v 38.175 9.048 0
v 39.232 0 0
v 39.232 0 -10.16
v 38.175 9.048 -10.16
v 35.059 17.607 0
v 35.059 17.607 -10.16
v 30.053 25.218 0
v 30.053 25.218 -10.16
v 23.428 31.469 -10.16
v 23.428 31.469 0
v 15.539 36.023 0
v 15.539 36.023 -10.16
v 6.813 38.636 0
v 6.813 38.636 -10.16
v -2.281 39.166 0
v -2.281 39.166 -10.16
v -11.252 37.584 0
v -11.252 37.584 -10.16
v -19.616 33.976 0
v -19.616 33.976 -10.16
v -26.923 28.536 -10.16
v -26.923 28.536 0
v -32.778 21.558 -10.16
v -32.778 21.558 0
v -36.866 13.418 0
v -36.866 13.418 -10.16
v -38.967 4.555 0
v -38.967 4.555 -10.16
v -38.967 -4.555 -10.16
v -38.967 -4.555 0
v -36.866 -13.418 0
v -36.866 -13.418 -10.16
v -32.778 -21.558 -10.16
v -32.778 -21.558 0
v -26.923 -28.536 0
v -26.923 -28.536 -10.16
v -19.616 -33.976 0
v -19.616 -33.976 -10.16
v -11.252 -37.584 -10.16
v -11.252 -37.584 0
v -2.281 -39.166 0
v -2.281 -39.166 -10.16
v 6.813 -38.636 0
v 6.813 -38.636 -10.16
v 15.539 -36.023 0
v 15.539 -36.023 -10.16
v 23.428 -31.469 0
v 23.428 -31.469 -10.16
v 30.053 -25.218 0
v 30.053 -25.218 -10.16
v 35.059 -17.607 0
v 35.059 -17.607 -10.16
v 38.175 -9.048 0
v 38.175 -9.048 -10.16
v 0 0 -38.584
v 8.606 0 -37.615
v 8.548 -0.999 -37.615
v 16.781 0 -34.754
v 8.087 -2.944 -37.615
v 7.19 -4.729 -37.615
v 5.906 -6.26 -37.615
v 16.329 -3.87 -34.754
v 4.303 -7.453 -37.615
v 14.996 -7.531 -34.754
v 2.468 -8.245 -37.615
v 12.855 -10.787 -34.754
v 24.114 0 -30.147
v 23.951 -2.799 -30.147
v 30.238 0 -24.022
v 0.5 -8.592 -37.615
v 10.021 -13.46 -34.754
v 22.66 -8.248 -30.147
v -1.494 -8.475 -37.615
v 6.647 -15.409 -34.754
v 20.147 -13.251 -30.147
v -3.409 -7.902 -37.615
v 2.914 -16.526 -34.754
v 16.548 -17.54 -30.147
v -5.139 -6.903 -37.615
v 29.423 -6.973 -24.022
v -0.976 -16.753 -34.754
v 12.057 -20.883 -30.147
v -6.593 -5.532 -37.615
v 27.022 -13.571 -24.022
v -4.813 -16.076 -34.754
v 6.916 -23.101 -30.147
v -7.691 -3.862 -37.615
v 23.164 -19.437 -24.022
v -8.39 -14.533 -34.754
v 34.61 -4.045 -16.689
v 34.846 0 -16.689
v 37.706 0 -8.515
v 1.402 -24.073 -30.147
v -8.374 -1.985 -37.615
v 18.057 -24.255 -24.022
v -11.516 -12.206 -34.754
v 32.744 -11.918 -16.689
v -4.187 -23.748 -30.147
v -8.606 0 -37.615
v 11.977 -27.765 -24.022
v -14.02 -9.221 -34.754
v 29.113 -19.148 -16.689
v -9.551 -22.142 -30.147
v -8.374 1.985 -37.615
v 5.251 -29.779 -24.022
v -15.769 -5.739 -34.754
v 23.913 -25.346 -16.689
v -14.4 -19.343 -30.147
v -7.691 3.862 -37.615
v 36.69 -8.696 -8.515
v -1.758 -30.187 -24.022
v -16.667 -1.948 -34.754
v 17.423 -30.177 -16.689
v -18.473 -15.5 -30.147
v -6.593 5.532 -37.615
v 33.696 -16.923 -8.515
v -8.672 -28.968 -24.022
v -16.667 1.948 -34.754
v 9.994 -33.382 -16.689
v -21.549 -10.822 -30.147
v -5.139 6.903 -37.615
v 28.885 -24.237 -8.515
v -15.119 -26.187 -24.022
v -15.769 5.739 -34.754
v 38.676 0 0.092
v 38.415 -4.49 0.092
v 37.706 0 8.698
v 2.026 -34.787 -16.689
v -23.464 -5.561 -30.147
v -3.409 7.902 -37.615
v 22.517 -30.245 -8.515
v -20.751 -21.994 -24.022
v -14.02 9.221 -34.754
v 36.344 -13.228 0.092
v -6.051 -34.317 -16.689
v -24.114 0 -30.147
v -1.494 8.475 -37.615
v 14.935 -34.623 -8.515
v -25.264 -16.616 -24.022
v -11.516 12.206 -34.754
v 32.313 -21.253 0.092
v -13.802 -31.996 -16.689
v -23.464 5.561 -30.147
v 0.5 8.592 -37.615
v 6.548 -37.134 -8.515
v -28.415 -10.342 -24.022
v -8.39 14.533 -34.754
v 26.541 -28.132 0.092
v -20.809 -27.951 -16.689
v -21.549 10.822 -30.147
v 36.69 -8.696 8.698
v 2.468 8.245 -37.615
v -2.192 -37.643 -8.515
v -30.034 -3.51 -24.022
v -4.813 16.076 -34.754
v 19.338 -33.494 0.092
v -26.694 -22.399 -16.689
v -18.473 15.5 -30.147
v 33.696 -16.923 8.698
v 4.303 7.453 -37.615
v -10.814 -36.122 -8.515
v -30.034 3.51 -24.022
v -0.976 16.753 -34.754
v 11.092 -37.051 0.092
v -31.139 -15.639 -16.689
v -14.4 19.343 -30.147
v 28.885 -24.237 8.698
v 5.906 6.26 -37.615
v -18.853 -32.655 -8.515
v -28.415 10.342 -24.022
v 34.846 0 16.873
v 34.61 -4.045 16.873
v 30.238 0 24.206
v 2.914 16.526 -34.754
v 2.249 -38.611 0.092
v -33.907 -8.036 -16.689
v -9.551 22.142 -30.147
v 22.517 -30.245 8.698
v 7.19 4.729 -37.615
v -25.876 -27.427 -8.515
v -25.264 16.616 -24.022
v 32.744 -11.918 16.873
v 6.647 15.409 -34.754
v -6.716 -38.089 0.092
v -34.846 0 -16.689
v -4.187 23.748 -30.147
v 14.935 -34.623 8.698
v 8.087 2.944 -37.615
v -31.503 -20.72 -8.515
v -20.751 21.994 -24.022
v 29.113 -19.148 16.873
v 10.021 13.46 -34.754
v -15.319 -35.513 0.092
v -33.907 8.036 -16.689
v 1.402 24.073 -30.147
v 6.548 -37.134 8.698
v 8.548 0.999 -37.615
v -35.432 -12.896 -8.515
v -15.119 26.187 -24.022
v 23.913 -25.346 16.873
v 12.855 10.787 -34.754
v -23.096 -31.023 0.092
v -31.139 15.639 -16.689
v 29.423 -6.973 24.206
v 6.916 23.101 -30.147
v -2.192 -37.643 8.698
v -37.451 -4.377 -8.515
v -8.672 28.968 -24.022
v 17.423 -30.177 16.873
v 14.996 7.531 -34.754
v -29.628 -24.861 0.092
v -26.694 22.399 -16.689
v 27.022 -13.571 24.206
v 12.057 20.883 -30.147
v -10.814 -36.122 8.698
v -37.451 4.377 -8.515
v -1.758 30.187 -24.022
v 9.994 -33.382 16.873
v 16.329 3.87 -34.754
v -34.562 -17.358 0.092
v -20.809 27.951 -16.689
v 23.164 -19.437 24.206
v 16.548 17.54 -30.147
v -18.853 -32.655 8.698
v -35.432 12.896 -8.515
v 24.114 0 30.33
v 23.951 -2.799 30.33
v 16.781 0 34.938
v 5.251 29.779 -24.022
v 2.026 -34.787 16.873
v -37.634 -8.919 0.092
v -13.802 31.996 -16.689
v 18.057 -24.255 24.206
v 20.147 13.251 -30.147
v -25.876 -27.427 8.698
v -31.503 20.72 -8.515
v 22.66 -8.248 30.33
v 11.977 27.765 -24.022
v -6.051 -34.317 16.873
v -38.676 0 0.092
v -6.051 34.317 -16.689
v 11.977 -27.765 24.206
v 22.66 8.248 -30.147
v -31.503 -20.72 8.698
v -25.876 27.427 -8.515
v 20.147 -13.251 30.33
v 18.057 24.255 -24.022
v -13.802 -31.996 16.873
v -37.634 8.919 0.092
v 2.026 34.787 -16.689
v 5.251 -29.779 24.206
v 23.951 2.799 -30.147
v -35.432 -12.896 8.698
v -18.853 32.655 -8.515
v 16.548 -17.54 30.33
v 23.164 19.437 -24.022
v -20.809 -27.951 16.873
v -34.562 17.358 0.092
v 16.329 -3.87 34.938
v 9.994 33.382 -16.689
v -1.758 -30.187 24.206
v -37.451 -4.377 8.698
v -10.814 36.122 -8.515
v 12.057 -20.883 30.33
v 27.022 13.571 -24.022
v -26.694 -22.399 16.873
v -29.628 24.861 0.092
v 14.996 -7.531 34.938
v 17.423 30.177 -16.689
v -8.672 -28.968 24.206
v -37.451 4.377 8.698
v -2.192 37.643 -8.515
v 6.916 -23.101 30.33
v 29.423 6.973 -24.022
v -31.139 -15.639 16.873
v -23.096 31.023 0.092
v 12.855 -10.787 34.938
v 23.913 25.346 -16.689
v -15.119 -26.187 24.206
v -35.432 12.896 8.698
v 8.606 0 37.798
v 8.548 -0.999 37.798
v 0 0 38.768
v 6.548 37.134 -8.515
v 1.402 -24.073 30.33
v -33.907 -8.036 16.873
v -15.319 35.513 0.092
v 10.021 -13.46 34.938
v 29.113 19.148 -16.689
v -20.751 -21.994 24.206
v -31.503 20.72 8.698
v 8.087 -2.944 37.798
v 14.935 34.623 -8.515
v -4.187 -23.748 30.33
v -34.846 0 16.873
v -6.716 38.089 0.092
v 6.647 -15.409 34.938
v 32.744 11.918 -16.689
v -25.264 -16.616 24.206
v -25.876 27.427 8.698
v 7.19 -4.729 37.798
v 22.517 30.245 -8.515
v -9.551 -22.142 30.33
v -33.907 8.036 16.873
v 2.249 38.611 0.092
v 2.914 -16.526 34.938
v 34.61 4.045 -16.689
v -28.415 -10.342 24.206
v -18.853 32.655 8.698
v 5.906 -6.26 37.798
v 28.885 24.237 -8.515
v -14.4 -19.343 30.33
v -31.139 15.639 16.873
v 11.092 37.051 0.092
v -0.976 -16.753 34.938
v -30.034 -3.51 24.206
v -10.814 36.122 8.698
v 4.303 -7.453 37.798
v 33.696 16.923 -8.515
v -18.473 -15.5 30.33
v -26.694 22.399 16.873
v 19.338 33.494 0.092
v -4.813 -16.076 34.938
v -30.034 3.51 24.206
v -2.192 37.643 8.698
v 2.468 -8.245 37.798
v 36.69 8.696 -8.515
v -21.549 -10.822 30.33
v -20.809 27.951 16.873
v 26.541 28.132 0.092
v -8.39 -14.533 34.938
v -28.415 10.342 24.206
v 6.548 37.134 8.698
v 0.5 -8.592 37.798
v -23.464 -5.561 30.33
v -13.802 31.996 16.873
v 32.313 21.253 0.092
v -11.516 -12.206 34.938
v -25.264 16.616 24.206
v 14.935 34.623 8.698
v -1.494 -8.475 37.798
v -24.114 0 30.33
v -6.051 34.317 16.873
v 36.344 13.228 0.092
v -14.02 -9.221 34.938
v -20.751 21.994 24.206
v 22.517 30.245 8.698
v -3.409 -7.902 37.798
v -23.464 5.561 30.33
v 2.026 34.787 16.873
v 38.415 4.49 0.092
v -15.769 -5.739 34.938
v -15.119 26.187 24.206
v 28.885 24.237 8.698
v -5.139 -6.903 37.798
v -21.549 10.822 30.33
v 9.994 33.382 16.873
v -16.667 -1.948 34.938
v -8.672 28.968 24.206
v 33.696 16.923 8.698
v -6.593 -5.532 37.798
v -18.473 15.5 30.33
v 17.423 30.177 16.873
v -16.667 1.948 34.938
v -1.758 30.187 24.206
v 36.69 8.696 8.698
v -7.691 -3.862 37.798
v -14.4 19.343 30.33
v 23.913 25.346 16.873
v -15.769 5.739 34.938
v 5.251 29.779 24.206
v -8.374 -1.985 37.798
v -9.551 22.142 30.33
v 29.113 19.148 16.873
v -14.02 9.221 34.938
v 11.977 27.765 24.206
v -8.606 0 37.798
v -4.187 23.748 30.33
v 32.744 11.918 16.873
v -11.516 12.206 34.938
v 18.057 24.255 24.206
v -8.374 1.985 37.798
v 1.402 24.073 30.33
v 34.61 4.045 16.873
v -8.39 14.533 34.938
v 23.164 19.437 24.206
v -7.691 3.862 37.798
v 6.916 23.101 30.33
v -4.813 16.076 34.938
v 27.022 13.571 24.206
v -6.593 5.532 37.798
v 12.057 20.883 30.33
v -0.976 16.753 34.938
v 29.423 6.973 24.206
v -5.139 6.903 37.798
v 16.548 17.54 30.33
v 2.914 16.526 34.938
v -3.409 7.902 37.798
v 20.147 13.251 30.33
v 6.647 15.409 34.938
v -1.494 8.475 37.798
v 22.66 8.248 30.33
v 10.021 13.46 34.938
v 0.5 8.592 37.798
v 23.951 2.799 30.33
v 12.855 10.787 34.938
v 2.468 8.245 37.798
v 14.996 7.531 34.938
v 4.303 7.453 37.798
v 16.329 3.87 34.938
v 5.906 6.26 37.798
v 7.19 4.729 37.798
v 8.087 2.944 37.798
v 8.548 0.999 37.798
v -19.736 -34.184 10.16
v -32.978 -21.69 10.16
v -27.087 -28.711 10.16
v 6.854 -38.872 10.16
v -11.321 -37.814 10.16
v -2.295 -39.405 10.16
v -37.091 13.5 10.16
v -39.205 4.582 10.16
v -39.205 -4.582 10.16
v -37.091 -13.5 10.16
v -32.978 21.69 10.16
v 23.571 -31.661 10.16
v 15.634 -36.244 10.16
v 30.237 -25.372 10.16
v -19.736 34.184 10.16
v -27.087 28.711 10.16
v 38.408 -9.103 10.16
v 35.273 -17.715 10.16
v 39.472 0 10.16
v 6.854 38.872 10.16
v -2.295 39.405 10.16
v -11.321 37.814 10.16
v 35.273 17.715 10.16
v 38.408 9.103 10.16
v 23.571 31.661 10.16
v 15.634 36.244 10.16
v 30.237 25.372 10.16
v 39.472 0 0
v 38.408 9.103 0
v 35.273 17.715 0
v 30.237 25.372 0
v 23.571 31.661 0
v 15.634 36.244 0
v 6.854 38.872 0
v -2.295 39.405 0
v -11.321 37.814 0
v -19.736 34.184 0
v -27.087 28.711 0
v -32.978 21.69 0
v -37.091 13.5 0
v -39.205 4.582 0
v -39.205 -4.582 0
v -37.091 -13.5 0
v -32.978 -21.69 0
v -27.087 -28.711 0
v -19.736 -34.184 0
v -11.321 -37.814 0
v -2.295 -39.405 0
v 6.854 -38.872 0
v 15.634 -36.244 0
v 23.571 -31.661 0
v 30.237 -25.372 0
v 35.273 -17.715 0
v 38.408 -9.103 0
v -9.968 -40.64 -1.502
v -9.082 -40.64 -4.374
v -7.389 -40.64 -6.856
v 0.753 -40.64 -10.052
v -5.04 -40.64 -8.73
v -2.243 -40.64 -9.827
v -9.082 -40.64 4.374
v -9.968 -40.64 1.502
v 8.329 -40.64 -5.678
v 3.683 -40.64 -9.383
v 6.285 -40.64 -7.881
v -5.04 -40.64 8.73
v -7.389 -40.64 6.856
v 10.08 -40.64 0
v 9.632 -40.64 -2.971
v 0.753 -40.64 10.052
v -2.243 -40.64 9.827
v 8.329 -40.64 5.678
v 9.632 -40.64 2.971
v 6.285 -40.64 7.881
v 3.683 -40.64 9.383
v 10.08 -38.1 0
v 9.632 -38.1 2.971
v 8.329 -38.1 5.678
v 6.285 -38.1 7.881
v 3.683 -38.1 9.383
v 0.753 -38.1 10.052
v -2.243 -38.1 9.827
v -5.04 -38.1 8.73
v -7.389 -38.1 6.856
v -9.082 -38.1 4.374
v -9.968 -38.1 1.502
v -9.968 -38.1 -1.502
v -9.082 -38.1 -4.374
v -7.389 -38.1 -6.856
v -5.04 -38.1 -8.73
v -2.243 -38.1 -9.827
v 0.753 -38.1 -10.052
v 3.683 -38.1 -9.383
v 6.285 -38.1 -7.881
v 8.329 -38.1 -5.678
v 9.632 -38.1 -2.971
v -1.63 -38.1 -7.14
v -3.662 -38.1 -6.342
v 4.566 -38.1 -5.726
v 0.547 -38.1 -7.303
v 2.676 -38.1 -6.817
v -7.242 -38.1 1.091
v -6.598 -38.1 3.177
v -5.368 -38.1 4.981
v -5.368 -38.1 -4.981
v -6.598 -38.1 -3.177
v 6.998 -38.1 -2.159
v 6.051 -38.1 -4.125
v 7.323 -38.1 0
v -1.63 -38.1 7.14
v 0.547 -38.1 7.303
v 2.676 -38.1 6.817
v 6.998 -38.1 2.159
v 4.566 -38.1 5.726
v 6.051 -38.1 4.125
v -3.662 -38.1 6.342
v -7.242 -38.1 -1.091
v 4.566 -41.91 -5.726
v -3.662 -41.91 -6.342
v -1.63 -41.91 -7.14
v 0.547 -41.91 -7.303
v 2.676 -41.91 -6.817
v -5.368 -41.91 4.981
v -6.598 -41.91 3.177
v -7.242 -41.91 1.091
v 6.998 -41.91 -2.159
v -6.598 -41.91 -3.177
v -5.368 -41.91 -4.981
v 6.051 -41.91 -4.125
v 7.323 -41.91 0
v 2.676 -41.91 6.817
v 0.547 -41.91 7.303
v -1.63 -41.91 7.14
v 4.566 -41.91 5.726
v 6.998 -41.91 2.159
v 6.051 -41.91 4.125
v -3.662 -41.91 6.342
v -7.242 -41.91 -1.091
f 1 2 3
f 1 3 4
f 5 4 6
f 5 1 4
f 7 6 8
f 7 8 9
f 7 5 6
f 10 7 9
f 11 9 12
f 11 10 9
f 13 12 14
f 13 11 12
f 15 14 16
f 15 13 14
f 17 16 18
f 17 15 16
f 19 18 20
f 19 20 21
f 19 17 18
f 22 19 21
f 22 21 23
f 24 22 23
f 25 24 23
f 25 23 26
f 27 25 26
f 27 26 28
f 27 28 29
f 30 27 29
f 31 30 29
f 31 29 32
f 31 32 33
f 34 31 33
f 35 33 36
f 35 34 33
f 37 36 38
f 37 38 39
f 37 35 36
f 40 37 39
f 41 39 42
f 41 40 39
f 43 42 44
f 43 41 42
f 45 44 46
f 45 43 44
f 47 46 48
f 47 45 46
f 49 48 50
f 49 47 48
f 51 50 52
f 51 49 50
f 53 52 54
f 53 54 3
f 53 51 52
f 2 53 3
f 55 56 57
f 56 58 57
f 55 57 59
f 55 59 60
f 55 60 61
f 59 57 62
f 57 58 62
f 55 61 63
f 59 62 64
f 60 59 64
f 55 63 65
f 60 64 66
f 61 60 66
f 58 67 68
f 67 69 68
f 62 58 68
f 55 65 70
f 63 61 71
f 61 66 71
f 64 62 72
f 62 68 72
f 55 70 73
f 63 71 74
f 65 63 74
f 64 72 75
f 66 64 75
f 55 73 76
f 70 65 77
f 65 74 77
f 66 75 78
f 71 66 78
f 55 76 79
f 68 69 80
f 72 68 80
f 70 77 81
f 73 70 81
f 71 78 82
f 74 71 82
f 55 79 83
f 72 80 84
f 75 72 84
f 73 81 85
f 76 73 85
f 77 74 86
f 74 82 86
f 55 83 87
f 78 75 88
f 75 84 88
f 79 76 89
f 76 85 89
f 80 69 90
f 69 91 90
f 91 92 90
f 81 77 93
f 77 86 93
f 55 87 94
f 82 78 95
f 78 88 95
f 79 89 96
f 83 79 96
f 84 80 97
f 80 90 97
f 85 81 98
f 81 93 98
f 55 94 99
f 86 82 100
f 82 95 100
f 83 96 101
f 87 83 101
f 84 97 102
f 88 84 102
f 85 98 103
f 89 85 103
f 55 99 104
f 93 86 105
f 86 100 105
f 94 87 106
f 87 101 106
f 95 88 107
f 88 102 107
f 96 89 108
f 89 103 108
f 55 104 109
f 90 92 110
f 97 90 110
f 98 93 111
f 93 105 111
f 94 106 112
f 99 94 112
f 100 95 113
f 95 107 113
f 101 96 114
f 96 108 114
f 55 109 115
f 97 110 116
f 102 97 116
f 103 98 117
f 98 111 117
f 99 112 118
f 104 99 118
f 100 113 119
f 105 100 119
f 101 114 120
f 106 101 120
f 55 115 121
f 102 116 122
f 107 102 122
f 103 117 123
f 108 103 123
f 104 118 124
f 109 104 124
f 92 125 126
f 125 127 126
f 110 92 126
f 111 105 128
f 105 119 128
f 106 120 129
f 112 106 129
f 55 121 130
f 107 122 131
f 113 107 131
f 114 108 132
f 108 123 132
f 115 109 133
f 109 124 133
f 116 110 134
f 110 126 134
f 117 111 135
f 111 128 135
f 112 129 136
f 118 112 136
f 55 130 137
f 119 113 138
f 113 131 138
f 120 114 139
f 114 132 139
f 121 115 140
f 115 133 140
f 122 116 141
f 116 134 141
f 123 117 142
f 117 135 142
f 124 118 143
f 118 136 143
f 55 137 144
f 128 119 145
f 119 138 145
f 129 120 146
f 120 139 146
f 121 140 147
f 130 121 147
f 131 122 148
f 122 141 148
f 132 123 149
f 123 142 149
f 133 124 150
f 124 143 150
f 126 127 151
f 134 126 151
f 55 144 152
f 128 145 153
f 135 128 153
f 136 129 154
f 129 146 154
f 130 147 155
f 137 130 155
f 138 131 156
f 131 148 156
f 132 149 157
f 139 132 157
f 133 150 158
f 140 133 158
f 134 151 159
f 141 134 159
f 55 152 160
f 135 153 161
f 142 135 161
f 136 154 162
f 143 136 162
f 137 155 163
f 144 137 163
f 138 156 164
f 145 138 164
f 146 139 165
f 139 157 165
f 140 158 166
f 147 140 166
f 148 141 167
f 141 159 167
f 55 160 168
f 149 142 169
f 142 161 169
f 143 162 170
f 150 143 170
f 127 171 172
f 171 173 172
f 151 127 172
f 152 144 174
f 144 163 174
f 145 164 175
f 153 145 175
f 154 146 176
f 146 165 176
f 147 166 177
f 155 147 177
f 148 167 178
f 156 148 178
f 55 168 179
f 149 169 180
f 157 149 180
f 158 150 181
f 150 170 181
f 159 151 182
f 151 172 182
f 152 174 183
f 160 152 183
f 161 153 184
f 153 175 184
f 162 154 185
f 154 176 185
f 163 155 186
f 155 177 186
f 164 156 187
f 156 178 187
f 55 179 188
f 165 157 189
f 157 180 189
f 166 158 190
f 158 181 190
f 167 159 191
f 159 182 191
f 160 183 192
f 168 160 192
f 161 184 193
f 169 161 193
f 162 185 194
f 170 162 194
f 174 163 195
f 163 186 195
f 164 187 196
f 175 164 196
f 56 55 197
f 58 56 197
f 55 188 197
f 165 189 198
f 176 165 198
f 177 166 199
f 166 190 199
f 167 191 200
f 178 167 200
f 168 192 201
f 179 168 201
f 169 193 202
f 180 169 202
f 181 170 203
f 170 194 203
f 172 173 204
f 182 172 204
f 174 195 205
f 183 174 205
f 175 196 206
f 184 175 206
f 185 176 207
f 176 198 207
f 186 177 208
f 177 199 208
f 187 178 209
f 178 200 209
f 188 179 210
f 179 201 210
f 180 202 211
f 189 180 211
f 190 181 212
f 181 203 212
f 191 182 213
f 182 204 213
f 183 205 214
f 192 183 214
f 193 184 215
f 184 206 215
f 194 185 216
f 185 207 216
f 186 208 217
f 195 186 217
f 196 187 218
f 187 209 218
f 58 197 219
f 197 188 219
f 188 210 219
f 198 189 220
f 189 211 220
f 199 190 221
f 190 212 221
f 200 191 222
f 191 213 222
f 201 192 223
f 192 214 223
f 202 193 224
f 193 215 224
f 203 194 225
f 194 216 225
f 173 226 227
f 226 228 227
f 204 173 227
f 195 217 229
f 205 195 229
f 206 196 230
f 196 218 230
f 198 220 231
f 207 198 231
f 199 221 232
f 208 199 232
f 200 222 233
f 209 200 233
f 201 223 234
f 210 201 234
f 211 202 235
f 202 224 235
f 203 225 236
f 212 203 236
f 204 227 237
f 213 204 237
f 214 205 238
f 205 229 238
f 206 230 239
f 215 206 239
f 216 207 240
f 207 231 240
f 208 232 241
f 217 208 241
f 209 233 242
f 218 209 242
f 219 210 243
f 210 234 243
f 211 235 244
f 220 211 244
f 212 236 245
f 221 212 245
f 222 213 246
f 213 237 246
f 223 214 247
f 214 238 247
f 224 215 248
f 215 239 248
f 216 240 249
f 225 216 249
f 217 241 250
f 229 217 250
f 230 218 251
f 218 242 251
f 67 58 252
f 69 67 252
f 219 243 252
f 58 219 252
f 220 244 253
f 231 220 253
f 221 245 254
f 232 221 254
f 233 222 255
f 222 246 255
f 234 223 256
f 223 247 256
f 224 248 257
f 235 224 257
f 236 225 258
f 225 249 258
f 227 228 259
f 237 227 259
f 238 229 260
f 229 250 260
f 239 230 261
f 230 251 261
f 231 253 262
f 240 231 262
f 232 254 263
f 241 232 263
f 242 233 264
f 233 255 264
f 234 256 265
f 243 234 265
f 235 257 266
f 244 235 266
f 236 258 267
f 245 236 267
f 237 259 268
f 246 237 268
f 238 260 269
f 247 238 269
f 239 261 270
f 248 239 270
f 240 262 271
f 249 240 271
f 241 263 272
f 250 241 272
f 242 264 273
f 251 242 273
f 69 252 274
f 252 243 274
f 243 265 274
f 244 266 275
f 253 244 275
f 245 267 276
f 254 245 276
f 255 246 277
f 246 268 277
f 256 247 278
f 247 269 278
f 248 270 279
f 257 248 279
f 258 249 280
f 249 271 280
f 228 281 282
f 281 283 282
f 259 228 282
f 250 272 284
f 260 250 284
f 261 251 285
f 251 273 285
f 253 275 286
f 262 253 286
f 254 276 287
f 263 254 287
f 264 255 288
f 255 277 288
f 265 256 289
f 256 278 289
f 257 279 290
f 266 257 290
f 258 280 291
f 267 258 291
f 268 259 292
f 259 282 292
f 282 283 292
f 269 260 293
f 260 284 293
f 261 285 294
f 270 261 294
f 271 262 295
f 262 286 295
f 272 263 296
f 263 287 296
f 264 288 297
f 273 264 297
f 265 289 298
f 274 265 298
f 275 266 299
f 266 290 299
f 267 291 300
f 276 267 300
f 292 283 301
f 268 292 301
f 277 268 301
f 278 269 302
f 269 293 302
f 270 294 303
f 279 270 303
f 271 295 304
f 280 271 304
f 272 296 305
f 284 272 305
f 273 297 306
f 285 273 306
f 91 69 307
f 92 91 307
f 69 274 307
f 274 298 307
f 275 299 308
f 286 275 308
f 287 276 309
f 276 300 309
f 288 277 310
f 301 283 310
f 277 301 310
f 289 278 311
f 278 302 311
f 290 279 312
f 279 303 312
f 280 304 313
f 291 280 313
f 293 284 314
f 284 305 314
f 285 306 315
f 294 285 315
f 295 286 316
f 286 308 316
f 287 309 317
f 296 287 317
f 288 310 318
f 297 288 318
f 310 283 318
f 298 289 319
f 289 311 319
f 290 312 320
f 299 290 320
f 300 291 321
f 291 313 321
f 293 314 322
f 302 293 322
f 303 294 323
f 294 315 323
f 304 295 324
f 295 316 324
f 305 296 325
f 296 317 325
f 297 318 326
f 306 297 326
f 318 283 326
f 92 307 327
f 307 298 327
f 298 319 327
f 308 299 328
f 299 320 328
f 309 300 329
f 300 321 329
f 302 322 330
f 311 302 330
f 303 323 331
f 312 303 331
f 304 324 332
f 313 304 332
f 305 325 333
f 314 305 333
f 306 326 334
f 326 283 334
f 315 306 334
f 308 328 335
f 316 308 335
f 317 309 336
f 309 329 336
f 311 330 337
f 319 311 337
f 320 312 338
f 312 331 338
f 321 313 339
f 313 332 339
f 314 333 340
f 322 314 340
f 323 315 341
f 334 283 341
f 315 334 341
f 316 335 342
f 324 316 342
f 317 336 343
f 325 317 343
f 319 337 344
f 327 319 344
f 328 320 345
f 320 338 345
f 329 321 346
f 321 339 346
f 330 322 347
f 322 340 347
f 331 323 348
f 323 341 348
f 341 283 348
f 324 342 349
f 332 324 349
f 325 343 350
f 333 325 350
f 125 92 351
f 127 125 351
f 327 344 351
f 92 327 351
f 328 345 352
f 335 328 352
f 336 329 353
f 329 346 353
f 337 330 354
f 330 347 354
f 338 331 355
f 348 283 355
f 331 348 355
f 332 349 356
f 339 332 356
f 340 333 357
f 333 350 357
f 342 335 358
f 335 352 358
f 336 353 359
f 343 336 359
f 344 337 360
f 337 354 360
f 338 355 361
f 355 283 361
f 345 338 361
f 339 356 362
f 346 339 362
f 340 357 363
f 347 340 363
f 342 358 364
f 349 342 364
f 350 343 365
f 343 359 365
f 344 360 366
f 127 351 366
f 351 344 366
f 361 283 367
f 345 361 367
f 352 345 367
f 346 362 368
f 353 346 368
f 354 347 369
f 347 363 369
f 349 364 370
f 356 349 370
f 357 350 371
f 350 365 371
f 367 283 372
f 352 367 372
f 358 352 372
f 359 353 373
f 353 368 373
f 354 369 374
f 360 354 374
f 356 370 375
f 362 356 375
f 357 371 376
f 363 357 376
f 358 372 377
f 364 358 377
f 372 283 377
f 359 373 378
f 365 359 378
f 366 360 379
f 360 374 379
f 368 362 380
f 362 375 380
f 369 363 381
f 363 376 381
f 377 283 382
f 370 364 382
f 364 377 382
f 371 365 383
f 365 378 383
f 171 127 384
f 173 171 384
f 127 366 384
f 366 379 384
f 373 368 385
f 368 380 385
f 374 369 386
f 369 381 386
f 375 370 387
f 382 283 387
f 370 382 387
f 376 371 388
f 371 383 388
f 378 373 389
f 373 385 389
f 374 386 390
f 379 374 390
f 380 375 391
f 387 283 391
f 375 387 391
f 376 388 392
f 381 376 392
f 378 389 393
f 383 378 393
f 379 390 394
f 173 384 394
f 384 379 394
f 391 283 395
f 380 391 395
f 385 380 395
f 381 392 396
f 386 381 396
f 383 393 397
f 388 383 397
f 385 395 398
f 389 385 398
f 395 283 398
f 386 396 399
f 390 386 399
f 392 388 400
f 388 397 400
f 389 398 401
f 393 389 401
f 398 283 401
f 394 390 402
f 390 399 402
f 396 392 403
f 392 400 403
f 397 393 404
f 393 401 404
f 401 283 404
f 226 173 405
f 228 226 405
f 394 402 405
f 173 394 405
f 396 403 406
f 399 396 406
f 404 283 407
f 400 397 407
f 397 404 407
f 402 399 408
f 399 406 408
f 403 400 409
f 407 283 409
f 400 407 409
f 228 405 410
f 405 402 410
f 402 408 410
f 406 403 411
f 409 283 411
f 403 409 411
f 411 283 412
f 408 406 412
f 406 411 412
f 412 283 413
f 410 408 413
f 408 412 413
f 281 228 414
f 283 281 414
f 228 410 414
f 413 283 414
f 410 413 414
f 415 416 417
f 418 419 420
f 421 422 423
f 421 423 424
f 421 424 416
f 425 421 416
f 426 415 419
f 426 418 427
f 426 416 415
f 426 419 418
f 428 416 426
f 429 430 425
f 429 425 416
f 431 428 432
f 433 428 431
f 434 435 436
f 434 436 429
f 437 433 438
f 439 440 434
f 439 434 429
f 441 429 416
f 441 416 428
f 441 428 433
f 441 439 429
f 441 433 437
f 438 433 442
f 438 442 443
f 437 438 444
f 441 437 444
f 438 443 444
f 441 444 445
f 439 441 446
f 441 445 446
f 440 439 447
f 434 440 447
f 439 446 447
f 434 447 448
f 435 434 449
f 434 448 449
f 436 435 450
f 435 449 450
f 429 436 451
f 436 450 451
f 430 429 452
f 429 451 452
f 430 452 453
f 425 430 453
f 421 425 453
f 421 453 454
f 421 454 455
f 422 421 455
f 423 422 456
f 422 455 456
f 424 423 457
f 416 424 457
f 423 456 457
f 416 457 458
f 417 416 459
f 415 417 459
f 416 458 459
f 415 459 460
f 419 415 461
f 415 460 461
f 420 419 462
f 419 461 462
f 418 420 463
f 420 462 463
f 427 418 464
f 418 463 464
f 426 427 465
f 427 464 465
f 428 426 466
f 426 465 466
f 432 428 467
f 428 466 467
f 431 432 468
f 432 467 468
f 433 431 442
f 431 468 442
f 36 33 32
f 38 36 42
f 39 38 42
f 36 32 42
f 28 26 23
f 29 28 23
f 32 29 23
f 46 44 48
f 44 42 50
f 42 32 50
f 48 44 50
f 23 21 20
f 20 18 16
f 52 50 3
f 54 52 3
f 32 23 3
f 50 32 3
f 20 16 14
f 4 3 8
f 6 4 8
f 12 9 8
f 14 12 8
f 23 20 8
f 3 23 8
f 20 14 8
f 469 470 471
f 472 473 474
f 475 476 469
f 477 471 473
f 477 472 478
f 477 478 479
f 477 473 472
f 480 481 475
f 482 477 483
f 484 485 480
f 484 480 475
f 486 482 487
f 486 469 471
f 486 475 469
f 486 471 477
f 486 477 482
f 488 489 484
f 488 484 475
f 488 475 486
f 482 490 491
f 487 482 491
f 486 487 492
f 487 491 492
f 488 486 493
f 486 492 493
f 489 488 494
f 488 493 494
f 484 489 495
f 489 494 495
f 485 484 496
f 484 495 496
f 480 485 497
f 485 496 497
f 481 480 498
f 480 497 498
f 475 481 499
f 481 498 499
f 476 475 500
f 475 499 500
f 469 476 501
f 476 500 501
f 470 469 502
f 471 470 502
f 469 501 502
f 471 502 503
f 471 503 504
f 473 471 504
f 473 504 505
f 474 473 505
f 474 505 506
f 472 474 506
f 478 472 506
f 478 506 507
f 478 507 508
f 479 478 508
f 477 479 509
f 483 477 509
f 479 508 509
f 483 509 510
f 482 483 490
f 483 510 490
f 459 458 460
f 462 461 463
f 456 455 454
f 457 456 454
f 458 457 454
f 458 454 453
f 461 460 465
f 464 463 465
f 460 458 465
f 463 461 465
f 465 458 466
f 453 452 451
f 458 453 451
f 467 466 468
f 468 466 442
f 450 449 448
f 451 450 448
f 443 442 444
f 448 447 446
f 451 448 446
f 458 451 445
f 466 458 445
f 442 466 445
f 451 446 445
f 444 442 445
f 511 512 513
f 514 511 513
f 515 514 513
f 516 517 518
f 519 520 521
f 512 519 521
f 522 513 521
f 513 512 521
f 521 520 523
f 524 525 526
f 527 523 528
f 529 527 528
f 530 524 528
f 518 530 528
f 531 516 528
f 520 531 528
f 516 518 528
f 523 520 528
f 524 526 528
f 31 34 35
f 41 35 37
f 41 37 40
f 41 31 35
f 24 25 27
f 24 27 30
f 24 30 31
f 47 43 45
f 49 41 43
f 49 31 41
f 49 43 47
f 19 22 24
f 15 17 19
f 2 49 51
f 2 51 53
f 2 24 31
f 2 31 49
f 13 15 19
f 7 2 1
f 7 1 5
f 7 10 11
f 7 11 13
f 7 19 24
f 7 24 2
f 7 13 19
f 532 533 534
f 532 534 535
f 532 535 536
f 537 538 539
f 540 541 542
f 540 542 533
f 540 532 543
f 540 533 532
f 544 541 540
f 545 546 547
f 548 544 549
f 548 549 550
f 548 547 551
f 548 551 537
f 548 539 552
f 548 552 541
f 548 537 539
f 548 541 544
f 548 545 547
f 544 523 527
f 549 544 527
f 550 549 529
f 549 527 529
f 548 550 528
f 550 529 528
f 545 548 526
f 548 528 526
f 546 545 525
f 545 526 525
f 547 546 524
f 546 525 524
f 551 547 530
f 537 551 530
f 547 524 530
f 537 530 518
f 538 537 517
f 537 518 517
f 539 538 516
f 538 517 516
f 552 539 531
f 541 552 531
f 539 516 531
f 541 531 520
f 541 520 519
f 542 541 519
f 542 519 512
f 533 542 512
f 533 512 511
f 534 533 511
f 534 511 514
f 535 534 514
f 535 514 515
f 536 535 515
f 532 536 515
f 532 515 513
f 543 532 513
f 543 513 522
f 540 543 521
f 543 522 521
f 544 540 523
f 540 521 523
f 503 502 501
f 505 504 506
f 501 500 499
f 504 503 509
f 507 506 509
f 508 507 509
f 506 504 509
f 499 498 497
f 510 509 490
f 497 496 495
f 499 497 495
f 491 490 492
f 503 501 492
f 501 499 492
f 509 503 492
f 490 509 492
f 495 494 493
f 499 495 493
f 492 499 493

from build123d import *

# Parameters (mm, degrees)
F3_R      = 7.323363
F4_DEPTH  = 3.81
F5_R      = 10.080192
F6_DEPTH  = 2.54
F7_R      = 39.471742
F8_DEPTH  = 10.16
F9_R      = 39.232007
F10_DEPTH = 10.16


with BuildPart() as f1:
    # F0 (on Front) → F1 (revolve)
    with BuildSketch(Plane.XZ):
        with BuildLine():
            Line((0, 38.767733), (0, -38.584433))
            ThreePointArc((0, -38.584433), (38.676083, 0.09165), (0, 38.767733))
        make_face()
    revolve(axis=Axis((0, 0, 0.09165), (0, 0, -1)))


with BuildPart() as f4:
    # F3 (on offset) → F4 (new body)
    with BuildSketch(Plane.XZ.offset(38.1)):
        Circle(F3_R)
    extrude(amount=F4_DEPTH)


with BuildPart() as f6:
    # F5 (on offset) → F6 (new body)
    with BuildSketch(Plane.XZ.offset(38.1)):
        Circle(F5_R)
    extrude(amount=F6_DEPTH)


with BuildPart() as f8:
    # F7 (on Top) → F8 (new body)
    with BuildSketch(Plane.XY):
        Circle(F7_R)
    extrude(amount=F8_DEPTH)


with BuildPart() as f10:
    # F9 (on Top) → F10 (new body)
    with BuildSketch(Plane.XY):
        Circle(F9_R)
    extrude(amount=-F10_DEPTH)


solid = Compound([f1.part, f4.part, f6.part, f8.part, f10.part])
